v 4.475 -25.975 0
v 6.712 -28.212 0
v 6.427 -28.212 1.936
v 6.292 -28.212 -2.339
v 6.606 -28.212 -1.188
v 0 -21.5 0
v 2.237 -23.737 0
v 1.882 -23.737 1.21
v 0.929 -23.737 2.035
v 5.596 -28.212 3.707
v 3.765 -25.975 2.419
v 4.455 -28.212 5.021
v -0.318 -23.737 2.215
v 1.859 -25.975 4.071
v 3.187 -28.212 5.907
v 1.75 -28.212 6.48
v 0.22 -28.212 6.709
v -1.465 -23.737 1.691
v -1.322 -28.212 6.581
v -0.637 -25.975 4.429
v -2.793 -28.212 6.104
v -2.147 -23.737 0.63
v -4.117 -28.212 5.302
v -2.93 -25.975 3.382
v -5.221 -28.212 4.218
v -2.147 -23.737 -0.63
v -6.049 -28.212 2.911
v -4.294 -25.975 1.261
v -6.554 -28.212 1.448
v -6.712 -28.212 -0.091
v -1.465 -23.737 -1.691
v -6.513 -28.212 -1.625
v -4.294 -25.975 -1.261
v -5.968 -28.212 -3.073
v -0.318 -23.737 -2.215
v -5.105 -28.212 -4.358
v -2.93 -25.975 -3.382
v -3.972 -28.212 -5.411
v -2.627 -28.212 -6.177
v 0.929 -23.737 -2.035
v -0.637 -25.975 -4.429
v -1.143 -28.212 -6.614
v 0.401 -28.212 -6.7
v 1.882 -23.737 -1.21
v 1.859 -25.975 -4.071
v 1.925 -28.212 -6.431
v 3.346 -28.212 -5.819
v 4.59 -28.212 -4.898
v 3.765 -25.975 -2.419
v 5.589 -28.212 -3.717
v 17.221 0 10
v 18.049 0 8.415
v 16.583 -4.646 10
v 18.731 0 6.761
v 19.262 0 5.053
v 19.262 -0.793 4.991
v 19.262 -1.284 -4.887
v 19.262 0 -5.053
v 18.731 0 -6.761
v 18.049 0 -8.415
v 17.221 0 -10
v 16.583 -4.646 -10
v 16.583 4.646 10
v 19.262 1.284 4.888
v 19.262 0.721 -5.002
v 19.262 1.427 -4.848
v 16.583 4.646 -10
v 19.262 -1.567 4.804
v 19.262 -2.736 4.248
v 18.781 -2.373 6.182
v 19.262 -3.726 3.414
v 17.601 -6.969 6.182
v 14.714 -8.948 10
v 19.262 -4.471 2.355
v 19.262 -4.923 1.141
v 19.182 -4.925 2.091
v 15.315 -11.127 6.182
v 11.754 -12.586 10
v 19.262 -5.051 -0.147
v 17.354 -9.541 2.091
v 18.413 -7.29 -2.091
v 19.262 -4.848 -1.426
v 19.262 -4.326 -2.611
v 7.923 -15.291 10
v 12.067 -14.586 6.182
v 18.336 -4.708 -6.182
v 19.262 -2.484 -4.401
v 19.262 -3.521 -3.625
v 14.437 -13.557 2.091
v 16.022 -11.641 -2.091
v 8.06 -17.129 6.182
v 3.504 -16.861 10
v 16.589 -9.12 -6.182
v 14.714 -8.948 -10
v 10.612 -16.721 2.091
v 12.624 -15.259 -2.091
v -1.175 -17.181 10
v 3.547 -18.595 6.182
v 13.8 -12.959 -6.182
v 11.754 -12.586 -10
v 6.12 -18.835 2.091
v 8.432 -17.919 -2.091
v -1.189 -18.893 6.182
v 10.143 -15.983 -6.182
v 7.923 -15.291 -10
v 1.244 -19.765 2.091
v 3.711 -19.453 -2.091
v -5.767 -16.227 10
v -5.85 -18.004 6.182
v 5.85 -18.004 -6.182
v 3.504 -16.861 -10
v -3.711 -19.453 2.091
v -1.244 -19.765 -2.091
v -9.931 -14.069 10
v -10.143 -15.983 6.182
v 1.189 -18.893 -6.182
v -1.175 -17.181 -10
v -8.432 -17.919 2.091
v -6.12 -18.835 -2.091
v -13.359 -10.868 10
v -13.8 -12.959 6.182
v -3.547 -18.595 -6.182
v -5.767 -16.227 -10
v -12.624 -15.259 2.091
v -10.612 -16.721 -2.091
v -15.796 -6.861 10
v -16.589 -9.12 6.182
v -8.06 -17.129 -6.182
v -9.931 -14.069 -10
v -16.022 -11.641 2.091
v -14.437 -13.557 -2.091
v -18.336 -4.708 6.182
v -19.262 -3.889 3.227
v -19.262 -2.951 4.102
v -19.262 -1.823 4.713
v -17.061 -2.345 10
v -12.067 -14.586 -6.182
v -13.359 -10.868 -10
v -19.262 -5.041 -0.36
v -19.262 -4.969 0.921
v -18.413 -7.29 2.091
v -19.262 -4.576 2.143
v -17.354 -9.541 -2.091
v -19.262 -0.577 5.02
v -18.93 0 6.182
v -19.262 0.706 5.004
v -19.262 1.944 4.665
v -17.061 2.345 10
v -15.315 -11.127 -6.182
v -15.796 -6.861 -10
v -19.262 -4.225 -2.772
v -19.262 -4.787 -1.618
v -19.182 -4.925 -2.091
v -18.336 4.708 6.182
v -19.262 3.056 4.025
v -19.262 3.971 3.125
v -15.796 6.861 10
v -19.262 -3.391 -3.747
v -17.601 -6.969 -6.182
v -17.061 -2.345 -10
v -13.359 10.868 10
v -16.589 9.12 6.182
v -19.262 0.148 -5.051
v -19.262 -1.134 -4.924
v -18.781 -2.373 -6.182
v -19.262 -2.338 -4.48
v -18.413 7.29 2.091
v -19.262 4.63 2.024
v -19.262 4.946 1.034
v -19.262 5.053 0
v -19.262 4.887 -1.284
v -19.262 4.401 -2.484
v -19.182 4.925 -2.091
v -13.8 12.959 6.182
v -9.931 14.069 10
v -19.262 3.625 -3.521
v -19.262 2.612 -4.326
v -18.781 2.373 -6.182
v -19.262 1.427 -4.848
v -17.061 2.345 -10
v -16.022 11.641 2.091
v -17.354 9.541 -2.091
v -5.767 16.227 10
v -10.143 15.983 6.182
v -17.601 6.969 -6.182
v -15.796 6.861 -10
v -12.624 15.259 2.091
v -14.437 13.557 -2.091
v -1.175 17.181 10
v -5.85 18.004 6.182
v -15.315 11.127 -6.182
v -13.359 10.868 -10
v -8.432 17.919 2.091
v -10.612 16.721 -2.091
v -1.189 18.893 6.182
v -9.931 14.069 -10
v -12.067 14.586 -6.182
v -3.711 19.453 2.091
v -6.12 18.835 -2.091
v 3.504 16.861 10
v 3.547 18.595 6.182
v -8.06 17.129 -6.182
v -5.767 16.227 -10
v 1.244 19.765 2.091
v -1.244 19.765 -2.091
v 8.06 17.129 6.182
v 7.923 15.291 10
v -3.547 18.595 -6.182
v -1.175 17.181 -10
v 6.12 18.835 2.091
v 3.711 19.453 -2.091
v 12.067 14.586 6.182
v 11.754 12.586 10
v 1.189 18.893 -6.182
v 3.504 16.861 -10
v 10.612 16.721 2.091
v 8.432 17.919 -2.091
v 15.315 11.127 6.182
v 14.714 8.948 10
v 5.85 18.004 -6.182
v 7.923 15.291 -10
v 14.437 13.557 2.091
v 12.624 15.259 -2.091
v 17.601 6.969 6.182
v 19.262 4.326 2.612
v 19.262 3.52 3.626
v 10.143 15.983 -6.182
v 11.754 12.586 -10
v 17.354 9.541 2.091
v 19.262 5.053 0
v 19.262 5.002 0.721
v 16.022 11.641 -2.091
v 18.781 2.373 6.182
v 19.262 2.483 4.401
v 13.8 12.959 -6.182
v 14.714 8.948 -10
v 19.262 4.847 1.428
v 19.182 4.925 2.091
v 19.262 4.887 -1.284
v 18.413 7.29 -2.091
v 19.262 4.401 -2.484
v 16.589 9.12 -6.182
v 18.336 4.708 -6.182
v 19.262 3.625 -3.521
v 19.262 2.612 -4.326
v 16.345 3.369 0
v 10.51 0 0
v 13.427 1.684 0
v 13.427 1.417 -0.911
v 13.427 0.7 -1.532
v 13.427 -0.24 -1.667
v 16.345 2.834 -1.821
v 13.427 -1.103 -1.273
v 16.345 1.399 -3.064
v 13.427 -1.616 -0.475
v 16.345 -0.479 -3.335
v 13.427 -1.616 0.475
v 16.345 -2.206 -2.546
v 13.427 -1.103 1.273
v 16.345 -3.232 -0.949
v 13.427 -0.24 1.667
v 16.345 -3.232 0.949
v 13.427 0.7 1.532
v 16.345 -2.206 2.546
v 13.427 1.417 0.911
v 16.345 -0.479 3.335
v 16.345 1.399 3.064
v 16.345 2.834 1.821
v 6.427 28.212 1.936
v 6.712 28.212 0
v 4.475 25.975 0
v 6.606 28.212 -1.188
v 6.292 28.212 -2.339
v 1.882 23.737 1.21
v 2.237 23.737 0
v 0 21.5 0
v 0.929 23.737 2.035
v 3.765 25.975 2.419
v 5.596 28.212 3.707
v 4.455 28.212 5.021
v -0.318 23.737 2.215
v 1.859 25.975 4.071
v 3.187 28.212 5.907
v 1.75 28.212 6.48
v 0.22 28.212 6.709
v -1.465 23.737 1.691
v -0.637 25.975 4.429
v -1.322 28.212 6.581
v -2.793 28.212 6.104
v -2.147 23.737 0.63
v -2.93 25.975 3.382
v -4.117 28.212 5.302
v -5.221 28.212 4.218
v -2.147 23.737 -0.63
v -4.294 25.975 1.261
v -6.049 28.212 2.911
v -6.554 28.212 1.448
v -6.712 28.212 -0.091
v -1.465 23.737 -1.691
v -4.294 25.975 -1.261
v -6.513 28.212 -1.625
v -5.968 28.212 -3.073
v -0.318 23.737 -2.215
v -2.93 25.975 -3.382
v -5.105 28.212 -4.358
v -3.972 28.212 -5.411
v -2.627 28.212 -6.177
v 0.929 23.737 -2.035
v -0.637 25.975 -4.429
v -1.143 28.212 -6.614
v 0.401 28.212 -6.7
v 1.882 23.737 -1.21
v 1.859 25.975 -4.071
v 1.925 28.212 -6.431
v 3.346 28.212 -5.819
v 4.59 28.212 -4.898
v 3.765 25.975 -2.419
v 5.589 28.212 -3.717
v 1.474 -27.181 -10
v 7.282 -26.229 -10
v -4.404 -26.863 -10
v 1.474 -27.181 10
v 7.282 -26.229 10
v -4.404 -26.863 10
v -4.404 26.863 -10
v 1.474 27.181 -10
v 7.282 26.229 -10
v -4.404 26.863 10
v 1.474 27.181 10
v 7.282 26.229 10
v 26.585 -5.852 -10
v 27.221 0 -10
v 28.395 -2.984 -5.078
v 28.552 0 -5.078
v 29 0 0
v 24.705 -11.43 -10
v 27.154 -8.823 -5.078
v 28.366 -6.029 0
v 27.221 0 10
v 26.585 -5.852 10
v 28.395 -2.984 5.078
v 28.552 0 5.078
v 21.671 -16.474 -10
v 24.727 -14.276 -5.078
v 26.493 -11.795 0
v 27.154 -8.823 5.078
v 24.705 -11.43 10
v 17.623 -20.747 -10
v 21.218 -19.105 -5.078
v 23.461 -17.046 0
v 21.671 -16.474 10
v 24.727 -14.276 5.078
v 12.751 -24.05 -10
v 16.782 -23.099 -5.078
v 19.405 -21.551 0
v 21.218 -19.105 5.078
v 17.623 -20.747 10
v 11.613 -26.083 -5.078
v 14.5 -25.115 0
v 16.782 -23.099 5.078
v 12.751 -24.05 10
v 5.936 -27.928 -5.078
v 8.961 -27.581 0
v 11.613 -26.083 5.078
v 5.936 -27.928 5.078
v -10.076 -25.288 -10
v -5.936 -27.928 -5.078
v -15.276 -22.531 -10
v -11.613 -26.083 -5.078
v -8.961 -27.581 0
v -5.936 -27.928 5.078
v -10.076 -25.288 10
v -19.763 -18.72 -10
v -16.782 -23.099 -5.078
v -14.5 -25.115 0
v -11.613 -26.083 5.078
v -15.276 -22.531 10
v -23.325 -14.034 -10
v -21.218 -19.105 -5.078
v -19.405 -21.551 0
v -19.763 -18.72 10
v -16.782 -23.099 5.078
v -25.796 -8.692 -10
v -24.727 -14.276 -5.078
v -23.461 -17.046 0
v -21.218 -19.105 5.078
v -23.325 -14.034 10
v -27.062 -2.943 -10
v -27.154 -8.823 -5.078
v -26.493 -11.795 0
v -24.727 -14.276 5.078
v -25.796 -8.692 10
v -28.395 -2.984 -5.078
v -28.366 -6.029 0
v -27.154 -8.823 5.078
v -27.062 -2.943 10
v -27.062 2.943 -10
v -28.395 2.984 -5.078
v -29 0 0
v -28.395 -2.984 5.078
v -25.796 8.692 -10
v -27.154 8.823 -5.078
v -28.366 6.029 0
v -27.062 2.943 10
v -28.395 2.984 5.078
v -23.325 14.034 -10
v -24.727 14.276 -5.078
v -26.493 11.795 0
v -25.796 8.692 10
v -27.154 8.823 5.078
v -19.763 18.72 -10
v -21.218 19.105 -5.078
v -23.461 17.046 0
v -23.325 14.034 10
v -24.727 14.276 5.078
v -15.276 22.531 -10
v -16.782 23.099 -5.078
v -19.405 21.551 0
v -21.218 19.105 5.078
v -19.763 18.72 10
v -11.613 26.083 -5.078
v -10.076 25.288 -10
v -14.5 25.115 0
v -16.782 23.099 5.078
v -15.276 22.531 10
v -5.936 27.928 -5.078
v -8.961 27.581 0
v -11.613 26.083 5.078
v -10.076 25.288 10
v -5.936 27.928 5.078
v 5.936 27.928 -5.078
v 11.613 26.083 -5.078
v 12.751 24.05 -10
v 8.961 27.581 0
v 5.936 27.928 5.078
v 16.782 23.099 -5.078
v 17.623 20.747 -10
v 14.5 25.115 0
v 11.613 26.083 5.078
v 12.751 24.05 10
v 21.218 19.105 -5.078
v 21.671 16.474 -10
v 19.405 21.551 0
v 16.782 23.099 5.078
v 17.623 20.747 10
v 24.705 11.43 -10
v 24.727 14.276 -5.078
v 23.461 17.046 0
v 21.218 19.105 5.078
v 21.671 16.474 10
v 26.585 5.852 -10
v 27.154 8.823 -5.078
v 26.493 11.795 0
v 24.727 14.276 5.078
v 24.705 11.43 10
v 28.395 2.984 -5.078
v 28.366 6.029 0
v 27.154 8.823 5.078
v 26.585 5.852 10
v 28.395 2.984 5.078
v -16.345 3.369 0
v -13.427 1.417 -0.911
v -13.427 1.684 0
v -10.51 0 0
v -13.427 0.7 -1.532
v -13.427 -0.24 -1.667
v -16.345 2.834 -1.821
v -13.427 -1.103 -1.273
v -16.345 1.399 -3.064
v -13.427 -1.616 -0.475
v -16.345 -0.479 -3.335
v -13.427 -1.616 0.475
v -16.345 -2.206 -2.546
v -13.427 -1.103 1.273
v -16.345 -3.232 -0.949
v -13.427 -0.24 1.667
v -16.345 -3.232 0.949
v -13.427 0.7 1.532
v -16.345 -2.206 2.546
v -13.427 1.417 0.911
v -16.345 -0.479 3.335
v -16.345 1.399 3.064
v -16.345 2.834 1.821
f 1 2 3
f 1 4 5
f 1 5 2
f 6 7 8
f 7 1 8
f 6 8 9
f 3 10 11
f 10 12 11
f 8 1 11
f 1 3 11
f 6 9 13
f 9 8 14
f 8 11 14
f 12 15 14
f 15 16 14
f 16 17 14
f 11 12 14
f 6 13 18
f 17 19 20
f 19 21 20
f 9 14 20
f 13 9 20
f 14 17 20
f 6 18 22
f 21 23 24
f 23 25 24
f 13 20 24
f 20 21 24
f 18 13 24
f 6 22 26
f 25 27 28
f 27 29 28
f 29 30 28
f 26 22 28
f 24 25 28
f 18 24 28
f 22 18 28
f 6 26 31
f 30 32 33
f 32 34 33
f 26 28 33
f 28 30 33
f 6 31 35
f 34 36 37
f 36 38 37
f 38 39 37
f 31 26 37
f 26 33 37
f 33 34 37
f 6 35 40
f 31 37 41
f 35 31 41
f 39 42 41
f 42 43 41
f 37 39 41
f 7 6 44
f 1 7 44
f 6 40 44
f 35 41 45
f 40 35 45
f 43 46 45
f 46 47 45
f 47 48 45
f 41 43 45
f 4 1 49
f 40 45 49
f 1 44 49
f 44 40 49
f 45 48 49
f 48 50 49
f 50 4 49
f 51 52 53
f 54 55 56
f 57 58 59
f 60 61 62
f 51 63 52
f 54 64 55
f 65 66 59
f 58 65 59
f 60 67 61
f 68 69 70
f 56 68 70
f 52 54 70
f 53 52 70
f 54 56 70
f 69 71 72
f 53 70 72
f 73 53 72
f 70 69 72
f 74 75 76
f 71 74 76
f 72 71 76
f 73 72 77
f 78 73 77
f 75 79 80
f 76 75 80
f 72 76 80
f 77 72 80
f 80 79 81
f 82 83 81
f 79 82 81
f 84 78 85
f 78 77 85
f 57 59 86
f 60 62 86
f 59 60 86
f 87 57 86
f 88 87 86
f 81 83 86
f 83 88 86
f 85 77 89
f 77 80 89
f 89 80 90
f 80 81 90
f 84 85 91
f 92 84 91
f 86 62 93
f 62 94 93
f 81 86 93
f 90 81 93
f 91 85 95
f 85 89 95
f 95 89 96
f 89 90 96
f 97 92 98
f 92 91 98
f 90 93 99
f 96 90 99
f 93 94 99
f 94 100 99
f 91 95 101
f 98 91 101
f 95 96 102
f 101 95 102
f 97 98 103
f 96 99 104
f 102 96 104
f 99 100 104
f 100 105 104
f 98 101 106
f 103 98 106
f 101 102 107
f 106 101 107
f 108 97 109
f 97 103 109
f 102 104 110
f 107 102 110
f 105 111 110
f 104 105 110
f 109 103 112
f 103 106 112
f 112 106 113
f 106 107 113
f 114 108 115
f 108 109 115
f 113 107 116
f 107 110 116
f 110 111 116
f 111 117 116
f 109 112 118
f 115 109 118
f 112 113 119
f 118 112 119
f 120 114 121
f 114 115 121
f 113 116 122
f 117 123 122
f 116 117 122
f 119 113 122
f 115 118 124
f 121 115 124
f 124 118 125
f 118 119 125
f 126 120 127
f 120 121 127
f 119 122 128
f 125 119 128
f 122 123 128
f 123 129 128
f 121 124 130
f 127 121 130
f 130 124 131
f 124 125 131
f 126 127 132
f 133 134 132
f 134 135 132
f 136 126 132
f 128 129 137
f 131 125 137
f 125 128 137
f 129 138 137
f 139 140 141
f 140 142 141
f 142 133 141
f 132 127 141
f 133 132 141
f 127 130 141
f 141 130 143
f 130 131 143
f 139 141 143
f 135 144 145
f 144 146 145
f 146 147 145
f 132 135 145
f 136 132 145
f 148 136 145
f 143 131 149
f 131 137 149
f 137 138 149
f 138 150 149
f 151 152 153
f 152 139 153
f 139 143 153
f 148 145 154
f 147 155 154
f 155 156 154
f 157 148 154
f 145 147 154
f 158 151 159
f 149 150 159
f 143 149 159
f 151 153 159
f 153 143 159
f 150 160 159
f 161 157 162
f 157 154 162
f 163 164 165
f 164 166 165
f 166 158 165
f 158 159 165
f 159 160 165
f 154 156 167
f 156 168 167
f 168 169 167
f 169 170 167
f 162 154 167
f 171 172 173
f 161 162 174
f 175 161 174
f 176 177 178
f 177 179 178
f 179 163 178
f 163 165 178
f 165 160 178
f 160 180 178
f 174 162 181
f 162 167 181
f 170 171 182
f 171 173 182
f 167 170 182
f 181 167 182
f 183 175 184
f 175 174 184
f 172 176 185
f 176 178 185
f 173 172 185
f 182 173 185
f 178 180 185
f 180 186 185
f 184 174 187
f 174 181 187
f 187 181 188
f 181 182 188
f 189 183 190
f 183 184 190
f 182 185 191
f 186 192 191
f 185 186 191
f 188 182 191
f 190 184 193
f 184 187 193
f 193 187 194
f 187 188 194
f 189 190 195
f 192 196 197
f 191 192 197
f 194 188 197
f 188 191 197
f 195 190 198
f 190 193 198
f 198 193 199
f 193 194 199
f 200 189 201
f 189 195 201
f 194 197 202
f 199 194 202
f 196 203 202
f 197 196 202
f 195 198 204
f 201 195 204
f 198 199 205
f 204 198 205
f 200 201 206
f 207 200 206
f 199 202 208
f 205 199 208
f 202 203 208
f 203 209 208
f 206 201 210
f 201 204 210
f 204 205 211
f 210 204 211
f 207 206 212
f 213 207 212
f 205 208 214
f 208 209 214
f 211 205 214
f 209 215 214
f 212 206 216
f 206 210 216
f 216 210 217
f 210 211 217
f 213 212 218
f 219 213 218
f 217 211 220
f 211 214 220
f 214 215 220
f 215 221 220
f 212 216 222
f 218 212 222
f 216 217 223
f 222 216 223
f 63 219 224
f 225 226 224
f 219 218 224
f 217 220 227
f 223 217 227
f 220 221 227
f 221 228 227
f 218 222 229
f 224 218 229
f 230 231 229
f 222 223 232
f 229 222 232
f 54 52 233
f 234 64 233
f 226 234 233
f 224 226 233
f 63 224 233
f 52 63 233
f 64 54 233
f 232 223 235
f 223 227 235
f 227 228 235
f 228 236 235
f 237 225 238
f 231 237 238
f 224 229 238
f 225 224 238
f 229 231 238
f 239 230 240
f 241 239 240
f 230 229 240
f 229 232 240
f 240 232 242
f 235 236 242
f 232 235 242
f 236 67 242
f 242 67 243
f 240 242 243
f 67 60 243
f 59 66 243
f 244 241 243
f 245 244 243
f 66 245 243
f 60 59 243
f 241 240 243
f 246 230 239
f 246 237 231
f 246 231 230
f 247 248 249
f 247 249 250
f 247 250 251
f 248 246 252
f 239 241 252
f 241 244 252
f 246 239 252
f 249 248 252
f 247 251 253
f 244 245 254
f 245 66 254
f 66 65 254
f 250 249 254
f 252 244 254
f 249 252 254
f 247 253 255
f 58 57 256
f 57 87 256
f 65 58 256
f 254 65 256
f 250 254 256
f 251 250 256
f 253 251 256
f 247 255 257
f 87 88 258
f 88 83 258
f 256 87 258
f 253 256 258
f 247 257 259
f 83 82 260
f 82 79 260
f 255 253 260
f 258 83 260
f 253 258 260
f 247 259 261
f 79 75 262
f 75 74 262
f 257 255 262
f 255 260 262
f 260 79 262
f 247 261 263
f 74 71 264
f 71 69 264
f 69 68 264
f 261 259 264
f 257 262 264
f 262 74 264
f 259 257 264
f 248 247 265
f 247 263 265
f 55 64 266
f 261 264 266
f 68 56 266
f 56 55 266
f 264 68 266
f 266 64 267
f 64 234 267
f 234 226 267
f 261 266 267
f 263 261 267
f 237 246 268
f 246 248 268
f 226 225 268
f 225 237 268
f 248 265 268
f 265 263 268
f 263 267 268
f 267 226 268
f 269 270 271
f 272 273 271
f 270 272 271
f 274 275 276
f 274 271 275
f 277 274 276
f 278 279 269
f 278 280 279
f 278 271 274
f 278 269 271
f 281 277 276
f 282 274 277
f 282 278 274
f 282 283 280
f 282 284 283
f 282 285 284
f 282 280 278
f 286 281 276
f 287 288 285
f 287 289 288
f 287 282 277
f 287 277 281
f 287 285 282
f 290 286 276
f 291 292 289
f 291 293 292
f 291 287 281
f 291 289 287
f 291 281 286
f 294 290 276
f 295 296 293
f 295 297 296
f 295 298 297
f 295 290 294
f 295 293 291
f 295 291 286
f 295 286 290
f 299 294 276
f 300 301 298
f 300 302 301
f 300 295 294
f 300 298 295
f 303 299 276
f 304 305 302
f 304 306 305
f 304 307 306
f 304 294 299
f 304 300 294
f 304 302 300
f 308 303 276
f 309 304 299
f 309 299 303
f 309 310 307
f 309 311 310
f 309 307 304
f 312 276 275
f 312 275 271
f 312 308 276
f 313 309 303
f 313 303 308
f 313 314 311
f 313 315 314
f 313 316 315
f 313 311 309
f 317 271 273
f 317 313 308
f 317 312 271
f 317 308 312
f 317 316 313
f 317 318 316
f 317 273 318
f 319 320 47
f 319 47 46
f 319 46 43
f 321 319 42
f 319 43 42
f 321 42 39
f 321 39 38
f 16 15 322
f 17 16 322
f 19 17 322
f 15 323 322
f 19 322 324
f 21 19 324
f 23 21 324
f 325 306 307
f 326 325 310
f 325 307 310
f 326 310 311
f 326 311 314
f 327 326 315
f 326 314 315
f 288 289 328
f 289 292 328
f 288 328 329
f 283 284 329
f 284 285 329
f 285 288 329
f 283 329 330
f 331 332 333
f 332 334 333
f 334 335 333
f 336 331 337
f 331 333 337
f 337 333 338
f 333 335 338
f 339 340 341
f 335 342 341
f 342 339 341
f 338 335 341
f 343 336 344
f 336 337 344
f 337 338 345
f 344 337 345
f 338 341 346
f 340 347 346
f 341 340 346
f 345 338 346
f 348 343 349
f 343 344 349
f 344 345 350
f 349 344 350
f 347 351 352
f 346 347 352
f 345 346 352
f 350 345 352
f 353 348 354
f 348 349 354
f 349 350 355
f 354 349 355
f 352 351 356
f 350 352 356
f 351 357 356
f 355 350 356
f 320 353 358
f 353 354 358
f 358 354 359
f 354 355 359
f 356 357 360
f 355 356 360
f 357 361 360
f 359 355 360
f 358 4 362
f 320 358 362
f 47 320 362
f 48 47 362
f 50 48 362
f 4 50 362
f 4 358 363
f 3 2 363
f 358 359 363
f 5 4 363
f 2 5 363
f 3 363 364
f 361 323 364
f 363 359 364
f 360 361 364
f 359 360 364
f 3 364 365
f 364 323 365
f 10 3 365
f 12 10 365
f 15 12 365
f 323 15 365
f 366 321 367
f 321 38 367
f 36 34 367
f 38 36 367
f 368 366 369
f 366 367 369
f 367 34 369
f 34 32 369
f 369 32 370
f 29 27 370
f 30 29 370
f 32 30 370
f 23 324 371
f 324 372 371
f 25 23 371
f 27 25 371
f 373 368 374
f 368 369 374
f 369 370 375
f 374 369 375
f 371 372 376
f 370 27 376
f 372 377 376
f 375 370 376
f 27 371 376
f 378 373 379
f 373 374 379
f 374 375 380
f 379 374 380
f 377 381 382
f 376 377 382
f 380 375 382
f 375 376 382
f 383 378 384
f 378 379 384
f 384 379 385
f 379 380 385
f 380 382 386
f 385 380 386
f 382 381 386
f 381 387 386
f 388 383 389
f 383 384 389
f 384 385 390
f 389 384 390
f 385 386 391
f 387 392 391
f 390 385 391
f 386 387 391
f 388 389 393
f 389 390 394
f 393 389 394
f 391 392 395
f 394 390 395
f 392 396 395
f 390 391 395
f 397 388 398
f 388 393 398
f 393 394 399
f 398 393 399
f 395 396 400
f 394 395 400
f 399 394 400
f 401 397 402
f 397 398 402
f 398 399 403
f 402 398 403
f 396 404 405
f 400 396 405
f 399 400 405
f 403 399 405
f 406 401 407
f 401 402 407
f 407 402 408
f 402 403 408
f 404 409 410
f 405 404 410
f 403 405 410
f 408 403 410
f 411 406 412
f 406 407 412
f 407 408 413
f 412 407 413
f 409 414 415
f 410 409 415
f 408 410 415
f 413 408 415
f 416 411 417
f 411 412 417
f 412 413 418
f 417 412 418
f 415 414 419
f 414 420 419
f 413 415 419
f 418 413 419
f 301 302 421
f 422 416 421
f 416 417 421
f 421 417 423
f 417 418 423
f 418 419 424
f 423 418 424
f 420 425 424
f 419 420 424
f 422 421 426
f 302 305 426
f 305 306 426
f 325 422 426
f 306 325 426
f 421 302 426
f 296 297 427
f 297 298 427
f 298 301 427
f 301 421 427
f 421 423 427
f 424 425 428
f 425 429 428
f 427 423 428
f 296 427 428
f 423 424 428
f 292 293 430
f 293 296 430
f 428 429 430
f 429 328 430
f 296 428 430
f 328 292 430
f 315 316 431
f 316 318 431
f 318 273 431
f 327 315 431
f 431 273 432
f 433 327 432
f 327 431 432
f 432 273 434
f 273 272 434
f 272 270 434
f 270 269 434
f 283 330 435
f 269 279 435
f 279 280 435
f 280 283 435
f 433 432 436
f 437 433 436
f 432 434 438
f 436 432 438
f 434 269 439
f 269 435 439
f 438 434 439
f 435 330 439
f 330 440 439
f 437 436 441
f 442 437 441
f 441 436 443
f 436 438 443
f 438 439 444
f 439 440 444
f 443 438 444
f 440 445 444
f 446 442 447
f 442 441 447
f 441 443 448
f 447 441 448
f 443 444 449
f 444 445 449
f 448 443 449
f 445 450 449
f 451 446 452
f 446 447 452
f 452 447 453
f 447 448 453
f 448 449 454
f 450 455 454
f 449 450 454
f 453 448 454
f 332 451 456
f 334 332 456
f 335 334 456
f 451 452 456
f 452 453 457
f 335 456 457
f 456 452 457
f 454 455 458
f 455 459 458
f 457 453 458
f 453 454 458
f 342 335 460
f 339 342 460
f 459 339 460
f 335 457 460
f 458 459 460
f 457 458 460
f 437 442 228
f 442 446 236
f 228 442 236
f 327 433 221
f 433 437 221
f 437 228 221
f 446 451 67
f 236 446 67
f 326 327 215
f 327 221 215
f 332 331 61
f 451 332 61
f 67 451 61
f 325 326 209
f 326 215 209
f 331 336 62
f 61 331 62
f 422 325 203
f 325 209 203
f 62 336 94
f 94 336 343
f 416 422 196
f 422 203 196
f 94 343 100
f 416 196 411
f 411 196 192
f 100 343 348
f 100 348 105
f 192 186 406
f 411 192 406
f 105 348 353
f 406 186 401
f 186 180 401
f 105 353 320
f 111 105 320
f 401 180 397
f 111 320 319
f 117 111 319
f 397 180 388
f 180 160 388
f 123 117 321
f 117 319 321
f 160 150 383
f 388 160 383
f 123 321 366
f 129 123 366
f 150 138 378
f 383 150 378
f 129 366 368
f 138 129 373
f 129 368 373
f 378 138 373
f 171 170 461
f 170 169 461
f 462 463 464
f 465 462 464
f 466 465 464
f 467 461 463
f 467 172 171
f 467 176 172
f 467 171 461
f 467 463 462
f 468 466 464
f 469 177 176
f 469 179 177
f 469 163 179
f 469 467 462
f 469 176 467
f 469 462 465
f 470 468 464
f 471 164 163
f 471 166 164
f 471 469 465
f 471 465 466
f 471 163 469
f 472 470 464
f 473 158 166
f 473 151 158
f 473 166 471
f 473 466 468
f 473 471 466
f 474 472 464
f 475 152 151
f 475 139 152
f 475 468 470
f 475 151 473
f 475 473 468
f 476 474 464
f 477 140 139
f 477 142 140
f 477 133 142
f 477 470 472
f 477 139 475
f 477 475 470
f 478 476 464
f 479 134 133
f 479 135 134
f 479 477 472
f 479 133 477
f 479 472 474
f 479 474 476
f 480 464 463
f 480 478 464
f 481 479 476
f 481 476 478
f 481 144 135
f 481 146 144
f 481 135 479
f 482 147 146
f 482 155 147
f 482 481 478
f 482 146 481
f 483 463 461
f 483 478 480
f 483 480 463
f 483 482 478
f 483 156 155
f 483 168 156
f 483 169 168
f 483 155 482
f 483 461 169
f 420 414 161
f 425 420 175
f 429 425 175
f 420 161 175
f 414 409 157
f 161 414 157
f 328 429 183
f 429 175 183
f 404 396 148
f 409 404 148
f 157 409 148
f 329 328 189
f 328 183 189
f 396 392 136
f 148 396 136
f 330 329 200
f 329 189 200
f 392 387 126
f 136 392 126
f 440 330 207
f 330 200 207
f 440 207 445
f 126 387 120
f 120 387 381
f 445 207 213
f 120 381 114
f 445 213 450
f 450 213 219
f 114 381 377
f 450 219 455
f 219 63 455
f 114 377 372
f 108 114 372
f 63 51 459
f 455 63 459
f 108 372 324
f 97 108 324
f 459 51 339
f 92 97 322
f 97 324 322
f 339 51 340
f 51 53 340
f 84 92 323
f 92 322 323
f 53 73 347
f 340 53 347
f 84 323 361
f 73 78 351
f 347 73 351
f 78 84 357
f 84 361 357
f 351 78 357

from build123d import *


# Not quite as in the source:
# - a pattern or mirror of a feature is missing from the dataset's text; its kind, count and spacing are read off the source's solid


with BuildPart() as f1:
    # F0 (on Front) → F1 (revolve)
    with BuildSketch(Plane.XZ):
        with BuildLine():
            Line((27.2213151776, 10), (17.2213151776, 10))
            ThreePointArc((17.2213151776, 10), (19.9141581908, 0), (17.2213151776, -10))
            Line((17.2213151776, -10), (27.2213151776, -10))
            Line((27.2213151776, -10), (27.2213151776, 10))
        make_face()
        with BuildLine():
            ThreePointArc((27.2213151776, -10), (29, 0), (27.2213151776, 10))
            Line((27.2213151776, 10), (27.2213151776, -10))
        make_face()
    revolve(axis=Axis((0, 0, -0.0082536135), (0, 0, -1)))

    # F2 (on Top) → F3 (revolve, cut)
    with BuildSketch(Plane.XY):
        Polygon((0, 30.5), (0, 21.5), (9, 30.5), align=None)
    f3 = revolve(axis=Axis((0, 26, 0), (0, -1, 0)), mode=Mode.SUBTRACT)

    # F3_copies: F3 across plane
    add(f3.mirror(Plane(origin=(0, 0, 0), x_dir=(0, 0, -1), z_dir=(0, -1, 0))), mode=Mode.SUBTRACT)

    # F4 (on Top) → F5 (revolve)
    with BuildSketch(Plane.XY):
        Polygon((-10.5096189432, 0), (-23.5, 7.5), (-23.5, 0), align=None)
    f5 = revolve(axis=Axis((-17.0048094716, 0, 0), (-1, 0, 0)))

    # F5_copies: F5 across plane
    add(f5.mirror(Plane(origin=(0, 0, 0), x_dir=(0, 0, 1), z_dir=(1, 0, 0))))


solid = f1.part
